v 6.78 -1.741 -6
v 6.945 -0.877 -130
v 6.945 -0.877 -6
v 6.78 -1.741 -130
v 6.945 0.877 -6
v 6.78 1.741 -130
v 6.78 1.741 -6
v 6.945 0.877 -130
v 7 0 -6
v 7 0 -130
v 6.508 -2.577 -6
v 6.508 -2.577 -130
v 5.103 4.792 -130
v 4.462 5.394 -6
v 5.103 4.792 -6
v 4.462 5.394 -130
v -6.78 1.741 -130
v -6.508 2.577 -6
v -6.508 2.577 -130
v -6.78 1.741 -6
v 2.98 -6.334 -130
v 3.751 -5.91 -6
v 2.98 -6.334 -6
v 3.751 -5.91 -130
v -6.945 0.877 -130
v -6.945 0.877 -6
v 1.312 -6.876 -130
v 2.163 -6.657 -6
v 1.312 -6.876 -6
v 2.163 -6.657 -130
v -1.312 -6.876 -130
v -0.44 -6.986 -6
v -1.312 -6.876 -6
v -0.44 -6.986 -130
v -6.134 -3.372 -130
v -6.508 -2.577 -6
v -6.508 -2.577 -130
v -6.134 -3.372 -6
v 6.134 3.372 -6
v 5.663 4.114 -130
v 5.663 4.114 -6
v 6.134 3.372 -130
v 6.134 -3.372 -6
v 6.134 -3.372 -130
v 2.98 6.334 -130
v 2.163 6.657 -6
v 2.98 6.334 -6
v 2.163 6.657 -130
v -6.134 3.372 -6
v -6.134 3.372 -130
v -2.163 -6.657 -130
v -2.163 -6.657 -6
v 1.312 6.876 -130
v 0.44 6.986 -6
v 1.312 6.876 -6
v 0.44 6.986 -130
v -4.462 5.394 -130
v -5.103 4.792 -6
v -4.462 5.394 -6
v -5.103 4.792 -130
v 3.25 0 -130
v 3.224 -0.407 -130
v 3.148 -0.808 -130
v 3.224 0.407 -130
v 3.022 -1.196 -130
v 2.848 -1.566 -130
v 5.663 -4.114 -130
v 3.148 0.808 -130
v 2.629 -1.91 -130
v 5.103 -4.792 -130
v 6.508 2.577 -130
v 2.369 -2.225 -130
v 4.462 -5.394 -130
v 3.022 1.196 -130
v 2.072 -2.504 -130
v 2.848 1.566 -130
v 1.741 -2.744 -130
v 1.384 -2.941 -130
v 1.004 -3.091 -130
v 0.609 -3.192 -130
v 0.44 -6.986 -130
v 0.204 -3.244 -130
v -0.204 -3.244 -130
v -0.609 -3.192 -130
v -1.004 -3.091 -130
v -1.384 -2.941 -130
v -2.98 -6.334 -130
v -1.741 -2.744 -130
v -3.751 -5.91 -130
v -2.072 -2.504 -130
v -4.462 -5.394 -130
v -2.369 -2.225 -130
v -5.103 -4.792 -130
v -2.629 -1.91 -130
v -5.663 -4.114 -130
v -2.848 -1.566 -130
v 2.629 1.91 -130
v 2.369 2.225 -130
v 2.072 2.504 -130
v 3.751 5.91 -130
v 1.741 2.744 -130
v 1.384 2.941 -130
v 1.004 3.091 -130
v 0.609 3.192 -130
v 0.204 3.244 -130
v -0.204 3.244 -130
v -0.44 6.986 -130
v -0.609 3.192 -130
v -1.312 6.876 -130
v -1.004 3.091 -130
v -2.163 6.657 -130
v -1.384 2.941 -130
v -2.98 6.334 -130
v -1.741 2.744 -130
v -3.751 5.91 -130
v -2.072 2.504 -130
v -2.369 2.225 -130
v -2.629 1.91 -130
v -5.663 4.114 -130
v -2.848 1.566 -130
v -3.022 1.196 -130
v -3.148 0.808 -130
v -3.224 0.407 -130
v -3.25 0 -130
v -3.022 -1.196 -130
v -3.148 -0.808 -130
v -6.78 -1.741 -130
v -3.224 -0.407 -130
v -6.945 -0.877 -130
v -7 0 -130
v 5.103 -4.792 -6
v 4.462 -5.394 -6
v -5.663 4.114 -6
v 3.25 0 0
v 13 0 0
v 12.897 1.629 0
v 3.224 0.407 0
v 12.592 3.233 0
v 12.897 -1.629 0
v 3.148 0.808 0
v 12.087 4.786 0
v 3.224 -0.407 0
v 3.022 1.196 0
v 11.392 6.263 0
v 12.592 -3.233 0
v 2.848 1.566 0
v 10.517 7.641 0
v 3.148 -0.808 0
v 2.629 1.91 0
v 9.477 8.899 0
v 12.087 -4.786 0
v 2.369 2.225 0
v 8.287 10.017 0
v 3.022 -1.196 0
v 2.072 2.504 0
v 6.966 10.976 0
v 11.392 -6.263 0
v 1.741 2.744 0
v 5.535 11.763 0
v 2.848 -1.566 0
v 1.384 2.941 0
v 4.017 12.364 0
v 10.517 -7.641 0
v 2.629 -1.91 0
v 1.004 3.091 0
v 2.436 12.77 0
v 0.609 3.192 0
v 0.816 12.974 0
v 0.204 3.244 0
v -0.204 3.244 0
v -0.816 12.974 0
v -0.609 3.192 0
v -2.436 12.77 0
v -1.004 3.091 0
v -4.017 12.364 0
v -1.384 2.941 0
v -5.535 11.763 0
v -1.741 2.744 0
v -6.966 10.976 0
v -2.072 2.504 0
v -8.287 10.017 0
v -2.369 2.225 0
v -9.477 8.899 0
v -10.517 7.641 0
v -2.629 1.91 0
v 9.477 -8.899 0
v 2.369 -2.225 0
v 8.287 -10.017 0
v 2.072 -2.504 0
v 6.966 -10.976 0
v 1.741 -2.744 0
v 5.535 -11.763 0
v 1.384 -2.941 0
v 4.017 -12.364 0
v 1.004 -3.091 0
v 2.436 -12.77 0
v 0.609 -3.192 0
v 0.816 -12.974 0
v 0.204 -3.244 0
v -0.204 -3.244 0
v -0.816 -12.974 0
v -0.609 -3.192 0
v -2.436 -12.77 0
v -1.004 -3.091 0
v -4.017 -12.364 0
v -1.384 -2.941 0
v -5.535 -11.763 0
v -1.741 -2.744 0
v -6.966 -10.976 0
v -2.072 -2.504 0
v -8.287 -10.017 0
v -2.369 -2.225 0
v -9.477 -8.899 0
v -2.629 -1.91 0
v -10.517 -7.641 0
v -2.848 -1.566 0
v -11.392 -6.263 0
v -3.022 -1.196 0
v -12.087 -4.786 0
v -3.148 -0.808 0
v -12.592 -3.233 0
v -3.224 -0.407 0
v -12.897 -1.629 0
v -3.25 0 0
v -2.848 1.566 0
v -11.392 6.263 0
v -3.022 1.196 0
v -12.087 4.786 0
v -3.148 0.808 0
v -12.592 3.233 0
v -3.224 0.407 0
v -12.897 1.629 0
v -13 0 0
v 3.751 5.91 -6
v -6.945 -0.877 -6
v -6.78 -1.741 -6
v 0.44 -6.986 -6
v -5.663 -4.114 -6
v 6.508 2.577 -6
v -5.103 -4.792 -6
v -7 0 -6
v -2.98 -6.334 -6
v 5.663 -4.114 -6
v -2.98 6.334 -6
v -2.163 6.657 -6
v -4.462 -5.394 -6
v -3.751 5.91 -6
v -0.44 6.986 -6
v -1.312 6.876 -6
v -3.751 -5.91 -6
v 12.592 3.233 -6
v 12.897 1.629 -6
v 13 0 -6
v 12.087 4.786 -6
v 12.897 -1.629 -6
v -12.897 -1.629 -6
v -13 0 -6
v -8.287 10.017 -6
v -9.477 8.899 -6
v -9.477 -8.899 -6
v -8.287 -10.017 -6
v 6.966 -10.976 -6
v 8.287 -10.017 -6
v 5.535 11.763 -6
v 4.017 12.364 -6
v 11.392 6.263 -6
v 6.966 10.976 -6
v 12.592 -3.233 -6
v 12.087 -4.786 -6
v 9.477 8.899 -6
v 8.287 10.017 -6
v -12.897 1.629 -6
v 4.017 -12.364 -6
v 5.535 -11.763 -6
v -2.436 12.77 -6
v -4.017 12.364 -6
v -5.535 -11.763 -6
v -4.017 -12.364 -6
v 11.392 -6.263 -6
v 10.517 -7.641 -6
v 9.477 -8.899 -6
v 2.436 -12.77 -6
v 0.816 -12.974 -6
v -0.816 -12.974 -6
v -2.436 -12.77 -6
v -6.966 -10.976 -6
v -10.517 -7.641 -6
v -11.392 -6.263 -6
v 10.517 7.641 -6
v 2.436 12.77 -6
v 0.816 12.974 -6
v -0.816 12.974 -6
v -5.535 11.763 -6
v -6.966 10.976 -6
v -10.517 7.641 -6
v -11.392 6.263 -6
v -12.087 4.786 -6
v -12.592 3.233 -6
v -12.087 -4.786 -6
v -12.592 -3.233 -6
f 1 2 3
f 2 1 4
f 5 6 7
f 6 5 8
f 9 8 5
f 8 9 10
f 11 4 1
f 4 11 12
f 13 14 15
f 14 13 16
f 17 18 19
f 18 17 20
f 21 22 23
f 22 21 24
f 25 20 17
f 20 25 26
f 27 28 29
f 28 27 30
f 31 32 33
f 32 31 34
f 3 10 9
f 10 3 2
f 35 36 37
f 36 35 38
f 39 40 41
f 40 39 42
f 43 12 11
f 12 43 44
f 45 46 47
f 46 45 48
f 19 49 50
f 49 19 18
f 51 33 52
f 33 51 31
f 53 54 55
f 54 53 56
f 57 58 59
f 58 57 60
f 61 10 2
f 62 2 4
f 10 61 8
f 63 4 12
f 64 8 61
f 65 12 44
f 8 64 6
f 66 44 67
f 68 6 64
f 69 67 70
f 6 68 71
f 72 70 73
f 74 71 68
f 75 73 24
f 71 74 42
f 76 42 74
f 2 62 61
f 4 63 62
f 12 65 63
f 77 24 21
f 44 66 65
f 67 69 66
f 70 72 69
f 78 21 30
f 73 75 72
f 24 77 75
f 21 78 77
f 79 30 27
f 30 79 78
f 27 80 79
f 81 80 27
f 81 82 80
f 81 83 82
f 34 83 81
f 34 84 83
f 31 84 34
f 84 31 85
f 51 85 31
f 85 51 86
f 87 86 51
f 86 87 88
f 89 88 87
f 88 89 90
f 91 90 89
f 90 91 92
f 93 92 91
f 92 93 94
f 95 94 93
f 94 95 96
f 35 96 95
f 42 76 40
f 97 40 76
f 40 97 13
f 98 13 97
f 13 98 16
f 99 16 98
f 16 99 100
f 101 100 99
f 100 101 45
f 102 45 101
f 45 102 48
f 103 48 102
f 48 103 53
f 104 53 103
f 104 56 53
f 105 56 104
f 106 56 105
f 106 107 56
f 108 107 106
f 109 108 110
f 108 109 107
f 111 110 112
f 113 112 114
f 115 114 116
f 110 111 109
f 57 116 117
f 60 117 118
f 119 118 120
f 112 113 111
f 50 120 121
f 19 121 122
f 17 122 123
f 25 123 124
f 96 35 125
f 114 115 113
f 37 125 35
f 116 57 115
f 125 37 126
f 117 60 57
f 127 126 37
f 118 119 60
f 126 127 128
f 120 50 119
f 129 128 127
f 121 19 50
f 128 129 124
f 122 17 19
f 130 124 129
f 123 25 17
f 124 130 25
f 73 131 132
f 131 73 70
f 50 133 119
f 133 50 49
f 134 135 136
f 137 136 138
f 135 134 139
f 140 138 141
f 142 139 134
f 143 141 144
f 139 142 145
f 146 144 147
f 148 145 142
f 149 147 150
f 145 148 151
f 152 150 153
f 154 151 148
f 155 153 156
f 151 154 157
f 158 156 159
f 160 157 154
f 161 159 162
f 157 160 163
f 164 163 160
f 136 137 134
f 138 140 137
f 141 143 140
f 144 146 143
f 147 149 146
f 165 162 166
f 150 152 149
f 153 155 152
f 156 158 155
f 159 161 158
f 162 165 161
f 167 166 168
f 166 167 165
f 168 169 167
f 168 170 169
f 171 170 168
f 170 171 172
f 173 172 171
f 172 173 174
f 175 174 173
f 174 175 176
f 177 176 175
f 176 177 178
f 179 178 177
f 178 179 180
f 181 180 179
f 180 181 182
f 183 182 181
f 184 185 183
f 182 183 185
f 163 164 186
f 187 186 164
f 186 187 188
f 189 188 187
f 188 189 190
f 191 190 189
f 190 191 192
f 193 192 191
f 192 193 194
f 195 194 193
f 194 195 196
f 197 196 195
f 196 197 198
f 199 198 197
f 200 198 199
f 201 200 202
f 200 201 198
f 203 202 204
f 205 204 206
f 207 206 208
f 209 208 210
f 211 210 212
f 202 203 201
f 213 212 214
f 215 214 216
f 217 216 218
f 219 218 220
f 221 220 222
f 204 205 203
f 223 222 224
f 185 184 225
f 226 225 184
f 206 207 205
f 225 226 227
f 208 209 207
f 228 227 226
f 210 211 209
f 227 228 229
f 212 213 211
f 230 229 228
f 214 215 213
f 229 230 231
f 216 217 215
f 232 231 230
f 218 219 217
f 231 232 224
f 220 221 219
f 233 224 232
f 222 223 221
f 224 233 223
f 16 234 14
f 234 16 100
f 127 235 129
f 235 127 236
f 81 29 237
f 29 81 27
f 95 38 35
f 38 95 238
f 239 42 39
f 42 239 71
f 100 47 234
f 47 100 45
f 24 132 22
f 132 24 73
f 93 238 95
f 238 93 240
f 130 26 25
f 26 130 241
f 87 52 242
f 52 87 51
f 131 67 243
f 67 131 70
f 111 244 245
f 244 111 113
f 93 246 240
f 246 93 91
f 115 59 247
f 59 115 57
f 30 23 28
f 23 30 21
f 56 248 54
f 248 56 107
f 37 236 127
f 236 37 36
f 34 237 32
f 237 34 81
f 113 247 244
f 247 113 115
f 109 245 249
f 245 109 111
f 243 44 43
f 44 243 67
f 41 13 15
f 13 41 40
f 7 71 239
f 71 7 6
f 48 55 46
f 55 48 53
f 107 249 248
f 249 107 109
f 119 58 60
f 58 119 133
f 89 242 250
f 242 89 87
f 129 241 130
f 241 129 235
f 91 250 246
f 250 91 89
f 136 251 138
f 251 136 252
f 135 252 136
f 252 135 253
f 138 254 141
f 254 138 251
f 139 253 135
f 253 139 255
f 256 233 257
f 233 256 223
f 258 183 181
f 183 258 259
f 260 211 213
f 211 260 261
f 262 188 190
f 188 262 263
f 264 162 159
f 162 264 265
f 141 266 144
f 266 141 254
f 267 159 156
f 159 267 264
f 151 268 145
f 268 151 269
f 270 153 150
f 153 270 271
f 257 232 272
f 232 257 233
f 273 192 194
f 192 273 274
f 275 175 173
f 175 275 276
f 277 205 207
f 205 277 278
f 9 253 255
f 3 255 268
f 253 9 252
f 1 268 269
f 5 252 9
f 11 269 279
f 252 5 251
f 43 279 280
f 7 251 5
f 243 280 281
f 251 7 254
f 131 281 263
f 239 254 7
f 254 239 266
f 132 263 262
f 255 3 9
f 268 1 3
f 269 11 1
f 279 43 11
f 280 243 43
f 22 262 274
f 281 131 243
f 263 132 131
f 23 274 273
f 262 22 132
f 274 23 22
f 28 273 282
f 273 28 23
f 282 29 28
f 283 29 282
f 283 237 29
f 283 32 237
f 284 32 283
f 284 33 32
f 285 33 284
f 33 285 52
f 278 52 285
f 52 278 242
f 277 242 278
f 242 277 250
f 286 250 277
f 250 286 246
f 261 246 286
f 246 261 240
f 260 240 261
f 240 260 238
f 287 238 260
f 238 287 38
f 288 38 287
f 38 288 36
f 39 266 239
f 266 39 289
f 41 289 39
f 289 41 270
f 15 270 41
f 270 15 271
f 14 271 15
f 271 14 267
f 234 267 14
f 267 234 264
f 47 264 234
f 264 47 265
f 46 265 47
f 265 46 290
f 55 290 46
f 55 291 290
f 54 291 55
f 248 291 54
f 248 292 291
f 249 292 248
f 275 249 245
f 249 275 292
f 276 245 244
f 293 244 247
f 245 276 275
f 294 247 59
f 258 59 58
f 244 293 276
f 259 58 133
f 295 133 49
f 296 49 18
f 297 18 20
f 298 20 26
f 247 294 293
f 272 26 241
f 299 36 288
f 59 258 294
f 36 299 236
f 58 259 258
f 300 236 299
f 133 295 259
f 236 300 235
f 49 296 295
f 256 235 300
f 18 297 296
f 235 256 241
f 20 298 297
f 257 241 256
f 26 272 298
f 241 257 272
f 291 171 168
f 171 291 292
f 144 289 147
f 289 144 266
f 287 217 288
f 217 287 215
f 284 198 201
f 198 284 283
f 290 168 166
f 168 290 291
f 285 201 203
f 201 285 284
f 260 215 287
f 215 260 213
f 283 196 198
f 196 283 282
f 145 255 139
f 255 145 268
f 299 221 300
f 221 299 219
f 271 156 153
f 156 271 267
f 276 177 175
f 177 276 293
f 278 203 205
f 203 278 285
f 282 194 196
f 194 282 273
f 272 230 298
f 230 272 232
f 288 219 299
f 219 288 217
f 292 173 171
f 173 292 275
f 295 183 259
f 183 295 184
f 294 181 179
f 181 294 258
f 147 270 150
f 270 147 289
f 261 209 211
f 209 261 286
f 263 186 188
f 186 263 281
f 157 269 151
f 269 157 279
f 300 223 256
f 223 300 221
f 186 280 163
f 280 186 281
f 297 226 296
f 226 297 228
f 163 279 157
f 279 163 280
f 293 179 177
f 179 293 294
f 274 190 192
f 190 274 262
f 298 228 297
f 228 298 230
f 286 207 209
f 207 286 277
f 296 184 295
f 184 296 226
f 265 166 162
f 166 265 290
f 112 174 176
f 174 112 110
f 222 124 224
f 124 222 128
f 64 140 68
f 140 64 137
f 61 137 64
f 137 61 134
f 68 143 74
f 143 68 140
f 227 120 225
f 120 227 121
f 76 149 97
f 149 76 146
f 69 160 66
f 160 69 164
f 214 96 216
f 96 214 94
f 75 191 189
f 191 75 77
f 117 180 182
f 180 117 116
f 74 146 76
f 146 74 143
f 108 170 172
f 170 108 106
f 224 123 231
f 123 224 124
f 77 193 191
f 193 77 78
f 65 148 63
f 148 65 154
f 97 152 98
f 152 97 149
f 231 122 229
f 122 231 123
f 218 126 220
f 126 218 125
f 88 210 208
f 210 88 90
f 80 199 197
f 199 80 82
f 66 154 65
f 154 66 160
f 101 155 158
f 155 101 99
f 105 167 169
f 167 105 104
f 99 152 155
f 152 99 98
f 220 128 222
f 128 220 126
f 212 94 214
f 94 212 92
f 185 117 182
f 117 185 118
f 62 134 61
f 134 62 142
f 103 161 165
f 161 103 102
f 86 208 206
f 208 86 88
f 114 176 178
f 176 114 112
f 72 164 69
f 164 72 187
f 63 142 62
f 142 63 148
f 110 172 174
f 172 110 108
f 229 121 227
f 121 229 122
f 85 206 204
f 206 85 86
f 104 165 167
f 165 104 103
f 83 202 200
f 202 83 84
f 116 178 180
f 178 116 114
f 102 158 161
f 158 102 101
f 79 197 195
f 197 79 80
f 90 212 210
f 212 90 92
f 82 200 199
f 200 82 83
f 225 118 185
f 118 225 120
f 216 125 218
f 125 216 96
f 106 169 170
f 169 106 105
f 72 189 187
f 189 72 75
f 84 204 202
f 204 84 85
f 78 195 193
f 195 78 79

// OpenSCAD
$fn = 50;


difference() {
	union() {
		translate(v = [0, 0, -130.0000000000]) {
			cylinder(h = 130, r = 7.0000000000);
		}
		translate(v = [0, 0, -6.0000000000]) {
			cylinder(h = 6, r = 13.0000000000);
		}
	}
	union() {
		#translate(v = [0, 0, -130]) {
			cylinder(h = 130, r = 3.2500000000);
		}
	}
}
